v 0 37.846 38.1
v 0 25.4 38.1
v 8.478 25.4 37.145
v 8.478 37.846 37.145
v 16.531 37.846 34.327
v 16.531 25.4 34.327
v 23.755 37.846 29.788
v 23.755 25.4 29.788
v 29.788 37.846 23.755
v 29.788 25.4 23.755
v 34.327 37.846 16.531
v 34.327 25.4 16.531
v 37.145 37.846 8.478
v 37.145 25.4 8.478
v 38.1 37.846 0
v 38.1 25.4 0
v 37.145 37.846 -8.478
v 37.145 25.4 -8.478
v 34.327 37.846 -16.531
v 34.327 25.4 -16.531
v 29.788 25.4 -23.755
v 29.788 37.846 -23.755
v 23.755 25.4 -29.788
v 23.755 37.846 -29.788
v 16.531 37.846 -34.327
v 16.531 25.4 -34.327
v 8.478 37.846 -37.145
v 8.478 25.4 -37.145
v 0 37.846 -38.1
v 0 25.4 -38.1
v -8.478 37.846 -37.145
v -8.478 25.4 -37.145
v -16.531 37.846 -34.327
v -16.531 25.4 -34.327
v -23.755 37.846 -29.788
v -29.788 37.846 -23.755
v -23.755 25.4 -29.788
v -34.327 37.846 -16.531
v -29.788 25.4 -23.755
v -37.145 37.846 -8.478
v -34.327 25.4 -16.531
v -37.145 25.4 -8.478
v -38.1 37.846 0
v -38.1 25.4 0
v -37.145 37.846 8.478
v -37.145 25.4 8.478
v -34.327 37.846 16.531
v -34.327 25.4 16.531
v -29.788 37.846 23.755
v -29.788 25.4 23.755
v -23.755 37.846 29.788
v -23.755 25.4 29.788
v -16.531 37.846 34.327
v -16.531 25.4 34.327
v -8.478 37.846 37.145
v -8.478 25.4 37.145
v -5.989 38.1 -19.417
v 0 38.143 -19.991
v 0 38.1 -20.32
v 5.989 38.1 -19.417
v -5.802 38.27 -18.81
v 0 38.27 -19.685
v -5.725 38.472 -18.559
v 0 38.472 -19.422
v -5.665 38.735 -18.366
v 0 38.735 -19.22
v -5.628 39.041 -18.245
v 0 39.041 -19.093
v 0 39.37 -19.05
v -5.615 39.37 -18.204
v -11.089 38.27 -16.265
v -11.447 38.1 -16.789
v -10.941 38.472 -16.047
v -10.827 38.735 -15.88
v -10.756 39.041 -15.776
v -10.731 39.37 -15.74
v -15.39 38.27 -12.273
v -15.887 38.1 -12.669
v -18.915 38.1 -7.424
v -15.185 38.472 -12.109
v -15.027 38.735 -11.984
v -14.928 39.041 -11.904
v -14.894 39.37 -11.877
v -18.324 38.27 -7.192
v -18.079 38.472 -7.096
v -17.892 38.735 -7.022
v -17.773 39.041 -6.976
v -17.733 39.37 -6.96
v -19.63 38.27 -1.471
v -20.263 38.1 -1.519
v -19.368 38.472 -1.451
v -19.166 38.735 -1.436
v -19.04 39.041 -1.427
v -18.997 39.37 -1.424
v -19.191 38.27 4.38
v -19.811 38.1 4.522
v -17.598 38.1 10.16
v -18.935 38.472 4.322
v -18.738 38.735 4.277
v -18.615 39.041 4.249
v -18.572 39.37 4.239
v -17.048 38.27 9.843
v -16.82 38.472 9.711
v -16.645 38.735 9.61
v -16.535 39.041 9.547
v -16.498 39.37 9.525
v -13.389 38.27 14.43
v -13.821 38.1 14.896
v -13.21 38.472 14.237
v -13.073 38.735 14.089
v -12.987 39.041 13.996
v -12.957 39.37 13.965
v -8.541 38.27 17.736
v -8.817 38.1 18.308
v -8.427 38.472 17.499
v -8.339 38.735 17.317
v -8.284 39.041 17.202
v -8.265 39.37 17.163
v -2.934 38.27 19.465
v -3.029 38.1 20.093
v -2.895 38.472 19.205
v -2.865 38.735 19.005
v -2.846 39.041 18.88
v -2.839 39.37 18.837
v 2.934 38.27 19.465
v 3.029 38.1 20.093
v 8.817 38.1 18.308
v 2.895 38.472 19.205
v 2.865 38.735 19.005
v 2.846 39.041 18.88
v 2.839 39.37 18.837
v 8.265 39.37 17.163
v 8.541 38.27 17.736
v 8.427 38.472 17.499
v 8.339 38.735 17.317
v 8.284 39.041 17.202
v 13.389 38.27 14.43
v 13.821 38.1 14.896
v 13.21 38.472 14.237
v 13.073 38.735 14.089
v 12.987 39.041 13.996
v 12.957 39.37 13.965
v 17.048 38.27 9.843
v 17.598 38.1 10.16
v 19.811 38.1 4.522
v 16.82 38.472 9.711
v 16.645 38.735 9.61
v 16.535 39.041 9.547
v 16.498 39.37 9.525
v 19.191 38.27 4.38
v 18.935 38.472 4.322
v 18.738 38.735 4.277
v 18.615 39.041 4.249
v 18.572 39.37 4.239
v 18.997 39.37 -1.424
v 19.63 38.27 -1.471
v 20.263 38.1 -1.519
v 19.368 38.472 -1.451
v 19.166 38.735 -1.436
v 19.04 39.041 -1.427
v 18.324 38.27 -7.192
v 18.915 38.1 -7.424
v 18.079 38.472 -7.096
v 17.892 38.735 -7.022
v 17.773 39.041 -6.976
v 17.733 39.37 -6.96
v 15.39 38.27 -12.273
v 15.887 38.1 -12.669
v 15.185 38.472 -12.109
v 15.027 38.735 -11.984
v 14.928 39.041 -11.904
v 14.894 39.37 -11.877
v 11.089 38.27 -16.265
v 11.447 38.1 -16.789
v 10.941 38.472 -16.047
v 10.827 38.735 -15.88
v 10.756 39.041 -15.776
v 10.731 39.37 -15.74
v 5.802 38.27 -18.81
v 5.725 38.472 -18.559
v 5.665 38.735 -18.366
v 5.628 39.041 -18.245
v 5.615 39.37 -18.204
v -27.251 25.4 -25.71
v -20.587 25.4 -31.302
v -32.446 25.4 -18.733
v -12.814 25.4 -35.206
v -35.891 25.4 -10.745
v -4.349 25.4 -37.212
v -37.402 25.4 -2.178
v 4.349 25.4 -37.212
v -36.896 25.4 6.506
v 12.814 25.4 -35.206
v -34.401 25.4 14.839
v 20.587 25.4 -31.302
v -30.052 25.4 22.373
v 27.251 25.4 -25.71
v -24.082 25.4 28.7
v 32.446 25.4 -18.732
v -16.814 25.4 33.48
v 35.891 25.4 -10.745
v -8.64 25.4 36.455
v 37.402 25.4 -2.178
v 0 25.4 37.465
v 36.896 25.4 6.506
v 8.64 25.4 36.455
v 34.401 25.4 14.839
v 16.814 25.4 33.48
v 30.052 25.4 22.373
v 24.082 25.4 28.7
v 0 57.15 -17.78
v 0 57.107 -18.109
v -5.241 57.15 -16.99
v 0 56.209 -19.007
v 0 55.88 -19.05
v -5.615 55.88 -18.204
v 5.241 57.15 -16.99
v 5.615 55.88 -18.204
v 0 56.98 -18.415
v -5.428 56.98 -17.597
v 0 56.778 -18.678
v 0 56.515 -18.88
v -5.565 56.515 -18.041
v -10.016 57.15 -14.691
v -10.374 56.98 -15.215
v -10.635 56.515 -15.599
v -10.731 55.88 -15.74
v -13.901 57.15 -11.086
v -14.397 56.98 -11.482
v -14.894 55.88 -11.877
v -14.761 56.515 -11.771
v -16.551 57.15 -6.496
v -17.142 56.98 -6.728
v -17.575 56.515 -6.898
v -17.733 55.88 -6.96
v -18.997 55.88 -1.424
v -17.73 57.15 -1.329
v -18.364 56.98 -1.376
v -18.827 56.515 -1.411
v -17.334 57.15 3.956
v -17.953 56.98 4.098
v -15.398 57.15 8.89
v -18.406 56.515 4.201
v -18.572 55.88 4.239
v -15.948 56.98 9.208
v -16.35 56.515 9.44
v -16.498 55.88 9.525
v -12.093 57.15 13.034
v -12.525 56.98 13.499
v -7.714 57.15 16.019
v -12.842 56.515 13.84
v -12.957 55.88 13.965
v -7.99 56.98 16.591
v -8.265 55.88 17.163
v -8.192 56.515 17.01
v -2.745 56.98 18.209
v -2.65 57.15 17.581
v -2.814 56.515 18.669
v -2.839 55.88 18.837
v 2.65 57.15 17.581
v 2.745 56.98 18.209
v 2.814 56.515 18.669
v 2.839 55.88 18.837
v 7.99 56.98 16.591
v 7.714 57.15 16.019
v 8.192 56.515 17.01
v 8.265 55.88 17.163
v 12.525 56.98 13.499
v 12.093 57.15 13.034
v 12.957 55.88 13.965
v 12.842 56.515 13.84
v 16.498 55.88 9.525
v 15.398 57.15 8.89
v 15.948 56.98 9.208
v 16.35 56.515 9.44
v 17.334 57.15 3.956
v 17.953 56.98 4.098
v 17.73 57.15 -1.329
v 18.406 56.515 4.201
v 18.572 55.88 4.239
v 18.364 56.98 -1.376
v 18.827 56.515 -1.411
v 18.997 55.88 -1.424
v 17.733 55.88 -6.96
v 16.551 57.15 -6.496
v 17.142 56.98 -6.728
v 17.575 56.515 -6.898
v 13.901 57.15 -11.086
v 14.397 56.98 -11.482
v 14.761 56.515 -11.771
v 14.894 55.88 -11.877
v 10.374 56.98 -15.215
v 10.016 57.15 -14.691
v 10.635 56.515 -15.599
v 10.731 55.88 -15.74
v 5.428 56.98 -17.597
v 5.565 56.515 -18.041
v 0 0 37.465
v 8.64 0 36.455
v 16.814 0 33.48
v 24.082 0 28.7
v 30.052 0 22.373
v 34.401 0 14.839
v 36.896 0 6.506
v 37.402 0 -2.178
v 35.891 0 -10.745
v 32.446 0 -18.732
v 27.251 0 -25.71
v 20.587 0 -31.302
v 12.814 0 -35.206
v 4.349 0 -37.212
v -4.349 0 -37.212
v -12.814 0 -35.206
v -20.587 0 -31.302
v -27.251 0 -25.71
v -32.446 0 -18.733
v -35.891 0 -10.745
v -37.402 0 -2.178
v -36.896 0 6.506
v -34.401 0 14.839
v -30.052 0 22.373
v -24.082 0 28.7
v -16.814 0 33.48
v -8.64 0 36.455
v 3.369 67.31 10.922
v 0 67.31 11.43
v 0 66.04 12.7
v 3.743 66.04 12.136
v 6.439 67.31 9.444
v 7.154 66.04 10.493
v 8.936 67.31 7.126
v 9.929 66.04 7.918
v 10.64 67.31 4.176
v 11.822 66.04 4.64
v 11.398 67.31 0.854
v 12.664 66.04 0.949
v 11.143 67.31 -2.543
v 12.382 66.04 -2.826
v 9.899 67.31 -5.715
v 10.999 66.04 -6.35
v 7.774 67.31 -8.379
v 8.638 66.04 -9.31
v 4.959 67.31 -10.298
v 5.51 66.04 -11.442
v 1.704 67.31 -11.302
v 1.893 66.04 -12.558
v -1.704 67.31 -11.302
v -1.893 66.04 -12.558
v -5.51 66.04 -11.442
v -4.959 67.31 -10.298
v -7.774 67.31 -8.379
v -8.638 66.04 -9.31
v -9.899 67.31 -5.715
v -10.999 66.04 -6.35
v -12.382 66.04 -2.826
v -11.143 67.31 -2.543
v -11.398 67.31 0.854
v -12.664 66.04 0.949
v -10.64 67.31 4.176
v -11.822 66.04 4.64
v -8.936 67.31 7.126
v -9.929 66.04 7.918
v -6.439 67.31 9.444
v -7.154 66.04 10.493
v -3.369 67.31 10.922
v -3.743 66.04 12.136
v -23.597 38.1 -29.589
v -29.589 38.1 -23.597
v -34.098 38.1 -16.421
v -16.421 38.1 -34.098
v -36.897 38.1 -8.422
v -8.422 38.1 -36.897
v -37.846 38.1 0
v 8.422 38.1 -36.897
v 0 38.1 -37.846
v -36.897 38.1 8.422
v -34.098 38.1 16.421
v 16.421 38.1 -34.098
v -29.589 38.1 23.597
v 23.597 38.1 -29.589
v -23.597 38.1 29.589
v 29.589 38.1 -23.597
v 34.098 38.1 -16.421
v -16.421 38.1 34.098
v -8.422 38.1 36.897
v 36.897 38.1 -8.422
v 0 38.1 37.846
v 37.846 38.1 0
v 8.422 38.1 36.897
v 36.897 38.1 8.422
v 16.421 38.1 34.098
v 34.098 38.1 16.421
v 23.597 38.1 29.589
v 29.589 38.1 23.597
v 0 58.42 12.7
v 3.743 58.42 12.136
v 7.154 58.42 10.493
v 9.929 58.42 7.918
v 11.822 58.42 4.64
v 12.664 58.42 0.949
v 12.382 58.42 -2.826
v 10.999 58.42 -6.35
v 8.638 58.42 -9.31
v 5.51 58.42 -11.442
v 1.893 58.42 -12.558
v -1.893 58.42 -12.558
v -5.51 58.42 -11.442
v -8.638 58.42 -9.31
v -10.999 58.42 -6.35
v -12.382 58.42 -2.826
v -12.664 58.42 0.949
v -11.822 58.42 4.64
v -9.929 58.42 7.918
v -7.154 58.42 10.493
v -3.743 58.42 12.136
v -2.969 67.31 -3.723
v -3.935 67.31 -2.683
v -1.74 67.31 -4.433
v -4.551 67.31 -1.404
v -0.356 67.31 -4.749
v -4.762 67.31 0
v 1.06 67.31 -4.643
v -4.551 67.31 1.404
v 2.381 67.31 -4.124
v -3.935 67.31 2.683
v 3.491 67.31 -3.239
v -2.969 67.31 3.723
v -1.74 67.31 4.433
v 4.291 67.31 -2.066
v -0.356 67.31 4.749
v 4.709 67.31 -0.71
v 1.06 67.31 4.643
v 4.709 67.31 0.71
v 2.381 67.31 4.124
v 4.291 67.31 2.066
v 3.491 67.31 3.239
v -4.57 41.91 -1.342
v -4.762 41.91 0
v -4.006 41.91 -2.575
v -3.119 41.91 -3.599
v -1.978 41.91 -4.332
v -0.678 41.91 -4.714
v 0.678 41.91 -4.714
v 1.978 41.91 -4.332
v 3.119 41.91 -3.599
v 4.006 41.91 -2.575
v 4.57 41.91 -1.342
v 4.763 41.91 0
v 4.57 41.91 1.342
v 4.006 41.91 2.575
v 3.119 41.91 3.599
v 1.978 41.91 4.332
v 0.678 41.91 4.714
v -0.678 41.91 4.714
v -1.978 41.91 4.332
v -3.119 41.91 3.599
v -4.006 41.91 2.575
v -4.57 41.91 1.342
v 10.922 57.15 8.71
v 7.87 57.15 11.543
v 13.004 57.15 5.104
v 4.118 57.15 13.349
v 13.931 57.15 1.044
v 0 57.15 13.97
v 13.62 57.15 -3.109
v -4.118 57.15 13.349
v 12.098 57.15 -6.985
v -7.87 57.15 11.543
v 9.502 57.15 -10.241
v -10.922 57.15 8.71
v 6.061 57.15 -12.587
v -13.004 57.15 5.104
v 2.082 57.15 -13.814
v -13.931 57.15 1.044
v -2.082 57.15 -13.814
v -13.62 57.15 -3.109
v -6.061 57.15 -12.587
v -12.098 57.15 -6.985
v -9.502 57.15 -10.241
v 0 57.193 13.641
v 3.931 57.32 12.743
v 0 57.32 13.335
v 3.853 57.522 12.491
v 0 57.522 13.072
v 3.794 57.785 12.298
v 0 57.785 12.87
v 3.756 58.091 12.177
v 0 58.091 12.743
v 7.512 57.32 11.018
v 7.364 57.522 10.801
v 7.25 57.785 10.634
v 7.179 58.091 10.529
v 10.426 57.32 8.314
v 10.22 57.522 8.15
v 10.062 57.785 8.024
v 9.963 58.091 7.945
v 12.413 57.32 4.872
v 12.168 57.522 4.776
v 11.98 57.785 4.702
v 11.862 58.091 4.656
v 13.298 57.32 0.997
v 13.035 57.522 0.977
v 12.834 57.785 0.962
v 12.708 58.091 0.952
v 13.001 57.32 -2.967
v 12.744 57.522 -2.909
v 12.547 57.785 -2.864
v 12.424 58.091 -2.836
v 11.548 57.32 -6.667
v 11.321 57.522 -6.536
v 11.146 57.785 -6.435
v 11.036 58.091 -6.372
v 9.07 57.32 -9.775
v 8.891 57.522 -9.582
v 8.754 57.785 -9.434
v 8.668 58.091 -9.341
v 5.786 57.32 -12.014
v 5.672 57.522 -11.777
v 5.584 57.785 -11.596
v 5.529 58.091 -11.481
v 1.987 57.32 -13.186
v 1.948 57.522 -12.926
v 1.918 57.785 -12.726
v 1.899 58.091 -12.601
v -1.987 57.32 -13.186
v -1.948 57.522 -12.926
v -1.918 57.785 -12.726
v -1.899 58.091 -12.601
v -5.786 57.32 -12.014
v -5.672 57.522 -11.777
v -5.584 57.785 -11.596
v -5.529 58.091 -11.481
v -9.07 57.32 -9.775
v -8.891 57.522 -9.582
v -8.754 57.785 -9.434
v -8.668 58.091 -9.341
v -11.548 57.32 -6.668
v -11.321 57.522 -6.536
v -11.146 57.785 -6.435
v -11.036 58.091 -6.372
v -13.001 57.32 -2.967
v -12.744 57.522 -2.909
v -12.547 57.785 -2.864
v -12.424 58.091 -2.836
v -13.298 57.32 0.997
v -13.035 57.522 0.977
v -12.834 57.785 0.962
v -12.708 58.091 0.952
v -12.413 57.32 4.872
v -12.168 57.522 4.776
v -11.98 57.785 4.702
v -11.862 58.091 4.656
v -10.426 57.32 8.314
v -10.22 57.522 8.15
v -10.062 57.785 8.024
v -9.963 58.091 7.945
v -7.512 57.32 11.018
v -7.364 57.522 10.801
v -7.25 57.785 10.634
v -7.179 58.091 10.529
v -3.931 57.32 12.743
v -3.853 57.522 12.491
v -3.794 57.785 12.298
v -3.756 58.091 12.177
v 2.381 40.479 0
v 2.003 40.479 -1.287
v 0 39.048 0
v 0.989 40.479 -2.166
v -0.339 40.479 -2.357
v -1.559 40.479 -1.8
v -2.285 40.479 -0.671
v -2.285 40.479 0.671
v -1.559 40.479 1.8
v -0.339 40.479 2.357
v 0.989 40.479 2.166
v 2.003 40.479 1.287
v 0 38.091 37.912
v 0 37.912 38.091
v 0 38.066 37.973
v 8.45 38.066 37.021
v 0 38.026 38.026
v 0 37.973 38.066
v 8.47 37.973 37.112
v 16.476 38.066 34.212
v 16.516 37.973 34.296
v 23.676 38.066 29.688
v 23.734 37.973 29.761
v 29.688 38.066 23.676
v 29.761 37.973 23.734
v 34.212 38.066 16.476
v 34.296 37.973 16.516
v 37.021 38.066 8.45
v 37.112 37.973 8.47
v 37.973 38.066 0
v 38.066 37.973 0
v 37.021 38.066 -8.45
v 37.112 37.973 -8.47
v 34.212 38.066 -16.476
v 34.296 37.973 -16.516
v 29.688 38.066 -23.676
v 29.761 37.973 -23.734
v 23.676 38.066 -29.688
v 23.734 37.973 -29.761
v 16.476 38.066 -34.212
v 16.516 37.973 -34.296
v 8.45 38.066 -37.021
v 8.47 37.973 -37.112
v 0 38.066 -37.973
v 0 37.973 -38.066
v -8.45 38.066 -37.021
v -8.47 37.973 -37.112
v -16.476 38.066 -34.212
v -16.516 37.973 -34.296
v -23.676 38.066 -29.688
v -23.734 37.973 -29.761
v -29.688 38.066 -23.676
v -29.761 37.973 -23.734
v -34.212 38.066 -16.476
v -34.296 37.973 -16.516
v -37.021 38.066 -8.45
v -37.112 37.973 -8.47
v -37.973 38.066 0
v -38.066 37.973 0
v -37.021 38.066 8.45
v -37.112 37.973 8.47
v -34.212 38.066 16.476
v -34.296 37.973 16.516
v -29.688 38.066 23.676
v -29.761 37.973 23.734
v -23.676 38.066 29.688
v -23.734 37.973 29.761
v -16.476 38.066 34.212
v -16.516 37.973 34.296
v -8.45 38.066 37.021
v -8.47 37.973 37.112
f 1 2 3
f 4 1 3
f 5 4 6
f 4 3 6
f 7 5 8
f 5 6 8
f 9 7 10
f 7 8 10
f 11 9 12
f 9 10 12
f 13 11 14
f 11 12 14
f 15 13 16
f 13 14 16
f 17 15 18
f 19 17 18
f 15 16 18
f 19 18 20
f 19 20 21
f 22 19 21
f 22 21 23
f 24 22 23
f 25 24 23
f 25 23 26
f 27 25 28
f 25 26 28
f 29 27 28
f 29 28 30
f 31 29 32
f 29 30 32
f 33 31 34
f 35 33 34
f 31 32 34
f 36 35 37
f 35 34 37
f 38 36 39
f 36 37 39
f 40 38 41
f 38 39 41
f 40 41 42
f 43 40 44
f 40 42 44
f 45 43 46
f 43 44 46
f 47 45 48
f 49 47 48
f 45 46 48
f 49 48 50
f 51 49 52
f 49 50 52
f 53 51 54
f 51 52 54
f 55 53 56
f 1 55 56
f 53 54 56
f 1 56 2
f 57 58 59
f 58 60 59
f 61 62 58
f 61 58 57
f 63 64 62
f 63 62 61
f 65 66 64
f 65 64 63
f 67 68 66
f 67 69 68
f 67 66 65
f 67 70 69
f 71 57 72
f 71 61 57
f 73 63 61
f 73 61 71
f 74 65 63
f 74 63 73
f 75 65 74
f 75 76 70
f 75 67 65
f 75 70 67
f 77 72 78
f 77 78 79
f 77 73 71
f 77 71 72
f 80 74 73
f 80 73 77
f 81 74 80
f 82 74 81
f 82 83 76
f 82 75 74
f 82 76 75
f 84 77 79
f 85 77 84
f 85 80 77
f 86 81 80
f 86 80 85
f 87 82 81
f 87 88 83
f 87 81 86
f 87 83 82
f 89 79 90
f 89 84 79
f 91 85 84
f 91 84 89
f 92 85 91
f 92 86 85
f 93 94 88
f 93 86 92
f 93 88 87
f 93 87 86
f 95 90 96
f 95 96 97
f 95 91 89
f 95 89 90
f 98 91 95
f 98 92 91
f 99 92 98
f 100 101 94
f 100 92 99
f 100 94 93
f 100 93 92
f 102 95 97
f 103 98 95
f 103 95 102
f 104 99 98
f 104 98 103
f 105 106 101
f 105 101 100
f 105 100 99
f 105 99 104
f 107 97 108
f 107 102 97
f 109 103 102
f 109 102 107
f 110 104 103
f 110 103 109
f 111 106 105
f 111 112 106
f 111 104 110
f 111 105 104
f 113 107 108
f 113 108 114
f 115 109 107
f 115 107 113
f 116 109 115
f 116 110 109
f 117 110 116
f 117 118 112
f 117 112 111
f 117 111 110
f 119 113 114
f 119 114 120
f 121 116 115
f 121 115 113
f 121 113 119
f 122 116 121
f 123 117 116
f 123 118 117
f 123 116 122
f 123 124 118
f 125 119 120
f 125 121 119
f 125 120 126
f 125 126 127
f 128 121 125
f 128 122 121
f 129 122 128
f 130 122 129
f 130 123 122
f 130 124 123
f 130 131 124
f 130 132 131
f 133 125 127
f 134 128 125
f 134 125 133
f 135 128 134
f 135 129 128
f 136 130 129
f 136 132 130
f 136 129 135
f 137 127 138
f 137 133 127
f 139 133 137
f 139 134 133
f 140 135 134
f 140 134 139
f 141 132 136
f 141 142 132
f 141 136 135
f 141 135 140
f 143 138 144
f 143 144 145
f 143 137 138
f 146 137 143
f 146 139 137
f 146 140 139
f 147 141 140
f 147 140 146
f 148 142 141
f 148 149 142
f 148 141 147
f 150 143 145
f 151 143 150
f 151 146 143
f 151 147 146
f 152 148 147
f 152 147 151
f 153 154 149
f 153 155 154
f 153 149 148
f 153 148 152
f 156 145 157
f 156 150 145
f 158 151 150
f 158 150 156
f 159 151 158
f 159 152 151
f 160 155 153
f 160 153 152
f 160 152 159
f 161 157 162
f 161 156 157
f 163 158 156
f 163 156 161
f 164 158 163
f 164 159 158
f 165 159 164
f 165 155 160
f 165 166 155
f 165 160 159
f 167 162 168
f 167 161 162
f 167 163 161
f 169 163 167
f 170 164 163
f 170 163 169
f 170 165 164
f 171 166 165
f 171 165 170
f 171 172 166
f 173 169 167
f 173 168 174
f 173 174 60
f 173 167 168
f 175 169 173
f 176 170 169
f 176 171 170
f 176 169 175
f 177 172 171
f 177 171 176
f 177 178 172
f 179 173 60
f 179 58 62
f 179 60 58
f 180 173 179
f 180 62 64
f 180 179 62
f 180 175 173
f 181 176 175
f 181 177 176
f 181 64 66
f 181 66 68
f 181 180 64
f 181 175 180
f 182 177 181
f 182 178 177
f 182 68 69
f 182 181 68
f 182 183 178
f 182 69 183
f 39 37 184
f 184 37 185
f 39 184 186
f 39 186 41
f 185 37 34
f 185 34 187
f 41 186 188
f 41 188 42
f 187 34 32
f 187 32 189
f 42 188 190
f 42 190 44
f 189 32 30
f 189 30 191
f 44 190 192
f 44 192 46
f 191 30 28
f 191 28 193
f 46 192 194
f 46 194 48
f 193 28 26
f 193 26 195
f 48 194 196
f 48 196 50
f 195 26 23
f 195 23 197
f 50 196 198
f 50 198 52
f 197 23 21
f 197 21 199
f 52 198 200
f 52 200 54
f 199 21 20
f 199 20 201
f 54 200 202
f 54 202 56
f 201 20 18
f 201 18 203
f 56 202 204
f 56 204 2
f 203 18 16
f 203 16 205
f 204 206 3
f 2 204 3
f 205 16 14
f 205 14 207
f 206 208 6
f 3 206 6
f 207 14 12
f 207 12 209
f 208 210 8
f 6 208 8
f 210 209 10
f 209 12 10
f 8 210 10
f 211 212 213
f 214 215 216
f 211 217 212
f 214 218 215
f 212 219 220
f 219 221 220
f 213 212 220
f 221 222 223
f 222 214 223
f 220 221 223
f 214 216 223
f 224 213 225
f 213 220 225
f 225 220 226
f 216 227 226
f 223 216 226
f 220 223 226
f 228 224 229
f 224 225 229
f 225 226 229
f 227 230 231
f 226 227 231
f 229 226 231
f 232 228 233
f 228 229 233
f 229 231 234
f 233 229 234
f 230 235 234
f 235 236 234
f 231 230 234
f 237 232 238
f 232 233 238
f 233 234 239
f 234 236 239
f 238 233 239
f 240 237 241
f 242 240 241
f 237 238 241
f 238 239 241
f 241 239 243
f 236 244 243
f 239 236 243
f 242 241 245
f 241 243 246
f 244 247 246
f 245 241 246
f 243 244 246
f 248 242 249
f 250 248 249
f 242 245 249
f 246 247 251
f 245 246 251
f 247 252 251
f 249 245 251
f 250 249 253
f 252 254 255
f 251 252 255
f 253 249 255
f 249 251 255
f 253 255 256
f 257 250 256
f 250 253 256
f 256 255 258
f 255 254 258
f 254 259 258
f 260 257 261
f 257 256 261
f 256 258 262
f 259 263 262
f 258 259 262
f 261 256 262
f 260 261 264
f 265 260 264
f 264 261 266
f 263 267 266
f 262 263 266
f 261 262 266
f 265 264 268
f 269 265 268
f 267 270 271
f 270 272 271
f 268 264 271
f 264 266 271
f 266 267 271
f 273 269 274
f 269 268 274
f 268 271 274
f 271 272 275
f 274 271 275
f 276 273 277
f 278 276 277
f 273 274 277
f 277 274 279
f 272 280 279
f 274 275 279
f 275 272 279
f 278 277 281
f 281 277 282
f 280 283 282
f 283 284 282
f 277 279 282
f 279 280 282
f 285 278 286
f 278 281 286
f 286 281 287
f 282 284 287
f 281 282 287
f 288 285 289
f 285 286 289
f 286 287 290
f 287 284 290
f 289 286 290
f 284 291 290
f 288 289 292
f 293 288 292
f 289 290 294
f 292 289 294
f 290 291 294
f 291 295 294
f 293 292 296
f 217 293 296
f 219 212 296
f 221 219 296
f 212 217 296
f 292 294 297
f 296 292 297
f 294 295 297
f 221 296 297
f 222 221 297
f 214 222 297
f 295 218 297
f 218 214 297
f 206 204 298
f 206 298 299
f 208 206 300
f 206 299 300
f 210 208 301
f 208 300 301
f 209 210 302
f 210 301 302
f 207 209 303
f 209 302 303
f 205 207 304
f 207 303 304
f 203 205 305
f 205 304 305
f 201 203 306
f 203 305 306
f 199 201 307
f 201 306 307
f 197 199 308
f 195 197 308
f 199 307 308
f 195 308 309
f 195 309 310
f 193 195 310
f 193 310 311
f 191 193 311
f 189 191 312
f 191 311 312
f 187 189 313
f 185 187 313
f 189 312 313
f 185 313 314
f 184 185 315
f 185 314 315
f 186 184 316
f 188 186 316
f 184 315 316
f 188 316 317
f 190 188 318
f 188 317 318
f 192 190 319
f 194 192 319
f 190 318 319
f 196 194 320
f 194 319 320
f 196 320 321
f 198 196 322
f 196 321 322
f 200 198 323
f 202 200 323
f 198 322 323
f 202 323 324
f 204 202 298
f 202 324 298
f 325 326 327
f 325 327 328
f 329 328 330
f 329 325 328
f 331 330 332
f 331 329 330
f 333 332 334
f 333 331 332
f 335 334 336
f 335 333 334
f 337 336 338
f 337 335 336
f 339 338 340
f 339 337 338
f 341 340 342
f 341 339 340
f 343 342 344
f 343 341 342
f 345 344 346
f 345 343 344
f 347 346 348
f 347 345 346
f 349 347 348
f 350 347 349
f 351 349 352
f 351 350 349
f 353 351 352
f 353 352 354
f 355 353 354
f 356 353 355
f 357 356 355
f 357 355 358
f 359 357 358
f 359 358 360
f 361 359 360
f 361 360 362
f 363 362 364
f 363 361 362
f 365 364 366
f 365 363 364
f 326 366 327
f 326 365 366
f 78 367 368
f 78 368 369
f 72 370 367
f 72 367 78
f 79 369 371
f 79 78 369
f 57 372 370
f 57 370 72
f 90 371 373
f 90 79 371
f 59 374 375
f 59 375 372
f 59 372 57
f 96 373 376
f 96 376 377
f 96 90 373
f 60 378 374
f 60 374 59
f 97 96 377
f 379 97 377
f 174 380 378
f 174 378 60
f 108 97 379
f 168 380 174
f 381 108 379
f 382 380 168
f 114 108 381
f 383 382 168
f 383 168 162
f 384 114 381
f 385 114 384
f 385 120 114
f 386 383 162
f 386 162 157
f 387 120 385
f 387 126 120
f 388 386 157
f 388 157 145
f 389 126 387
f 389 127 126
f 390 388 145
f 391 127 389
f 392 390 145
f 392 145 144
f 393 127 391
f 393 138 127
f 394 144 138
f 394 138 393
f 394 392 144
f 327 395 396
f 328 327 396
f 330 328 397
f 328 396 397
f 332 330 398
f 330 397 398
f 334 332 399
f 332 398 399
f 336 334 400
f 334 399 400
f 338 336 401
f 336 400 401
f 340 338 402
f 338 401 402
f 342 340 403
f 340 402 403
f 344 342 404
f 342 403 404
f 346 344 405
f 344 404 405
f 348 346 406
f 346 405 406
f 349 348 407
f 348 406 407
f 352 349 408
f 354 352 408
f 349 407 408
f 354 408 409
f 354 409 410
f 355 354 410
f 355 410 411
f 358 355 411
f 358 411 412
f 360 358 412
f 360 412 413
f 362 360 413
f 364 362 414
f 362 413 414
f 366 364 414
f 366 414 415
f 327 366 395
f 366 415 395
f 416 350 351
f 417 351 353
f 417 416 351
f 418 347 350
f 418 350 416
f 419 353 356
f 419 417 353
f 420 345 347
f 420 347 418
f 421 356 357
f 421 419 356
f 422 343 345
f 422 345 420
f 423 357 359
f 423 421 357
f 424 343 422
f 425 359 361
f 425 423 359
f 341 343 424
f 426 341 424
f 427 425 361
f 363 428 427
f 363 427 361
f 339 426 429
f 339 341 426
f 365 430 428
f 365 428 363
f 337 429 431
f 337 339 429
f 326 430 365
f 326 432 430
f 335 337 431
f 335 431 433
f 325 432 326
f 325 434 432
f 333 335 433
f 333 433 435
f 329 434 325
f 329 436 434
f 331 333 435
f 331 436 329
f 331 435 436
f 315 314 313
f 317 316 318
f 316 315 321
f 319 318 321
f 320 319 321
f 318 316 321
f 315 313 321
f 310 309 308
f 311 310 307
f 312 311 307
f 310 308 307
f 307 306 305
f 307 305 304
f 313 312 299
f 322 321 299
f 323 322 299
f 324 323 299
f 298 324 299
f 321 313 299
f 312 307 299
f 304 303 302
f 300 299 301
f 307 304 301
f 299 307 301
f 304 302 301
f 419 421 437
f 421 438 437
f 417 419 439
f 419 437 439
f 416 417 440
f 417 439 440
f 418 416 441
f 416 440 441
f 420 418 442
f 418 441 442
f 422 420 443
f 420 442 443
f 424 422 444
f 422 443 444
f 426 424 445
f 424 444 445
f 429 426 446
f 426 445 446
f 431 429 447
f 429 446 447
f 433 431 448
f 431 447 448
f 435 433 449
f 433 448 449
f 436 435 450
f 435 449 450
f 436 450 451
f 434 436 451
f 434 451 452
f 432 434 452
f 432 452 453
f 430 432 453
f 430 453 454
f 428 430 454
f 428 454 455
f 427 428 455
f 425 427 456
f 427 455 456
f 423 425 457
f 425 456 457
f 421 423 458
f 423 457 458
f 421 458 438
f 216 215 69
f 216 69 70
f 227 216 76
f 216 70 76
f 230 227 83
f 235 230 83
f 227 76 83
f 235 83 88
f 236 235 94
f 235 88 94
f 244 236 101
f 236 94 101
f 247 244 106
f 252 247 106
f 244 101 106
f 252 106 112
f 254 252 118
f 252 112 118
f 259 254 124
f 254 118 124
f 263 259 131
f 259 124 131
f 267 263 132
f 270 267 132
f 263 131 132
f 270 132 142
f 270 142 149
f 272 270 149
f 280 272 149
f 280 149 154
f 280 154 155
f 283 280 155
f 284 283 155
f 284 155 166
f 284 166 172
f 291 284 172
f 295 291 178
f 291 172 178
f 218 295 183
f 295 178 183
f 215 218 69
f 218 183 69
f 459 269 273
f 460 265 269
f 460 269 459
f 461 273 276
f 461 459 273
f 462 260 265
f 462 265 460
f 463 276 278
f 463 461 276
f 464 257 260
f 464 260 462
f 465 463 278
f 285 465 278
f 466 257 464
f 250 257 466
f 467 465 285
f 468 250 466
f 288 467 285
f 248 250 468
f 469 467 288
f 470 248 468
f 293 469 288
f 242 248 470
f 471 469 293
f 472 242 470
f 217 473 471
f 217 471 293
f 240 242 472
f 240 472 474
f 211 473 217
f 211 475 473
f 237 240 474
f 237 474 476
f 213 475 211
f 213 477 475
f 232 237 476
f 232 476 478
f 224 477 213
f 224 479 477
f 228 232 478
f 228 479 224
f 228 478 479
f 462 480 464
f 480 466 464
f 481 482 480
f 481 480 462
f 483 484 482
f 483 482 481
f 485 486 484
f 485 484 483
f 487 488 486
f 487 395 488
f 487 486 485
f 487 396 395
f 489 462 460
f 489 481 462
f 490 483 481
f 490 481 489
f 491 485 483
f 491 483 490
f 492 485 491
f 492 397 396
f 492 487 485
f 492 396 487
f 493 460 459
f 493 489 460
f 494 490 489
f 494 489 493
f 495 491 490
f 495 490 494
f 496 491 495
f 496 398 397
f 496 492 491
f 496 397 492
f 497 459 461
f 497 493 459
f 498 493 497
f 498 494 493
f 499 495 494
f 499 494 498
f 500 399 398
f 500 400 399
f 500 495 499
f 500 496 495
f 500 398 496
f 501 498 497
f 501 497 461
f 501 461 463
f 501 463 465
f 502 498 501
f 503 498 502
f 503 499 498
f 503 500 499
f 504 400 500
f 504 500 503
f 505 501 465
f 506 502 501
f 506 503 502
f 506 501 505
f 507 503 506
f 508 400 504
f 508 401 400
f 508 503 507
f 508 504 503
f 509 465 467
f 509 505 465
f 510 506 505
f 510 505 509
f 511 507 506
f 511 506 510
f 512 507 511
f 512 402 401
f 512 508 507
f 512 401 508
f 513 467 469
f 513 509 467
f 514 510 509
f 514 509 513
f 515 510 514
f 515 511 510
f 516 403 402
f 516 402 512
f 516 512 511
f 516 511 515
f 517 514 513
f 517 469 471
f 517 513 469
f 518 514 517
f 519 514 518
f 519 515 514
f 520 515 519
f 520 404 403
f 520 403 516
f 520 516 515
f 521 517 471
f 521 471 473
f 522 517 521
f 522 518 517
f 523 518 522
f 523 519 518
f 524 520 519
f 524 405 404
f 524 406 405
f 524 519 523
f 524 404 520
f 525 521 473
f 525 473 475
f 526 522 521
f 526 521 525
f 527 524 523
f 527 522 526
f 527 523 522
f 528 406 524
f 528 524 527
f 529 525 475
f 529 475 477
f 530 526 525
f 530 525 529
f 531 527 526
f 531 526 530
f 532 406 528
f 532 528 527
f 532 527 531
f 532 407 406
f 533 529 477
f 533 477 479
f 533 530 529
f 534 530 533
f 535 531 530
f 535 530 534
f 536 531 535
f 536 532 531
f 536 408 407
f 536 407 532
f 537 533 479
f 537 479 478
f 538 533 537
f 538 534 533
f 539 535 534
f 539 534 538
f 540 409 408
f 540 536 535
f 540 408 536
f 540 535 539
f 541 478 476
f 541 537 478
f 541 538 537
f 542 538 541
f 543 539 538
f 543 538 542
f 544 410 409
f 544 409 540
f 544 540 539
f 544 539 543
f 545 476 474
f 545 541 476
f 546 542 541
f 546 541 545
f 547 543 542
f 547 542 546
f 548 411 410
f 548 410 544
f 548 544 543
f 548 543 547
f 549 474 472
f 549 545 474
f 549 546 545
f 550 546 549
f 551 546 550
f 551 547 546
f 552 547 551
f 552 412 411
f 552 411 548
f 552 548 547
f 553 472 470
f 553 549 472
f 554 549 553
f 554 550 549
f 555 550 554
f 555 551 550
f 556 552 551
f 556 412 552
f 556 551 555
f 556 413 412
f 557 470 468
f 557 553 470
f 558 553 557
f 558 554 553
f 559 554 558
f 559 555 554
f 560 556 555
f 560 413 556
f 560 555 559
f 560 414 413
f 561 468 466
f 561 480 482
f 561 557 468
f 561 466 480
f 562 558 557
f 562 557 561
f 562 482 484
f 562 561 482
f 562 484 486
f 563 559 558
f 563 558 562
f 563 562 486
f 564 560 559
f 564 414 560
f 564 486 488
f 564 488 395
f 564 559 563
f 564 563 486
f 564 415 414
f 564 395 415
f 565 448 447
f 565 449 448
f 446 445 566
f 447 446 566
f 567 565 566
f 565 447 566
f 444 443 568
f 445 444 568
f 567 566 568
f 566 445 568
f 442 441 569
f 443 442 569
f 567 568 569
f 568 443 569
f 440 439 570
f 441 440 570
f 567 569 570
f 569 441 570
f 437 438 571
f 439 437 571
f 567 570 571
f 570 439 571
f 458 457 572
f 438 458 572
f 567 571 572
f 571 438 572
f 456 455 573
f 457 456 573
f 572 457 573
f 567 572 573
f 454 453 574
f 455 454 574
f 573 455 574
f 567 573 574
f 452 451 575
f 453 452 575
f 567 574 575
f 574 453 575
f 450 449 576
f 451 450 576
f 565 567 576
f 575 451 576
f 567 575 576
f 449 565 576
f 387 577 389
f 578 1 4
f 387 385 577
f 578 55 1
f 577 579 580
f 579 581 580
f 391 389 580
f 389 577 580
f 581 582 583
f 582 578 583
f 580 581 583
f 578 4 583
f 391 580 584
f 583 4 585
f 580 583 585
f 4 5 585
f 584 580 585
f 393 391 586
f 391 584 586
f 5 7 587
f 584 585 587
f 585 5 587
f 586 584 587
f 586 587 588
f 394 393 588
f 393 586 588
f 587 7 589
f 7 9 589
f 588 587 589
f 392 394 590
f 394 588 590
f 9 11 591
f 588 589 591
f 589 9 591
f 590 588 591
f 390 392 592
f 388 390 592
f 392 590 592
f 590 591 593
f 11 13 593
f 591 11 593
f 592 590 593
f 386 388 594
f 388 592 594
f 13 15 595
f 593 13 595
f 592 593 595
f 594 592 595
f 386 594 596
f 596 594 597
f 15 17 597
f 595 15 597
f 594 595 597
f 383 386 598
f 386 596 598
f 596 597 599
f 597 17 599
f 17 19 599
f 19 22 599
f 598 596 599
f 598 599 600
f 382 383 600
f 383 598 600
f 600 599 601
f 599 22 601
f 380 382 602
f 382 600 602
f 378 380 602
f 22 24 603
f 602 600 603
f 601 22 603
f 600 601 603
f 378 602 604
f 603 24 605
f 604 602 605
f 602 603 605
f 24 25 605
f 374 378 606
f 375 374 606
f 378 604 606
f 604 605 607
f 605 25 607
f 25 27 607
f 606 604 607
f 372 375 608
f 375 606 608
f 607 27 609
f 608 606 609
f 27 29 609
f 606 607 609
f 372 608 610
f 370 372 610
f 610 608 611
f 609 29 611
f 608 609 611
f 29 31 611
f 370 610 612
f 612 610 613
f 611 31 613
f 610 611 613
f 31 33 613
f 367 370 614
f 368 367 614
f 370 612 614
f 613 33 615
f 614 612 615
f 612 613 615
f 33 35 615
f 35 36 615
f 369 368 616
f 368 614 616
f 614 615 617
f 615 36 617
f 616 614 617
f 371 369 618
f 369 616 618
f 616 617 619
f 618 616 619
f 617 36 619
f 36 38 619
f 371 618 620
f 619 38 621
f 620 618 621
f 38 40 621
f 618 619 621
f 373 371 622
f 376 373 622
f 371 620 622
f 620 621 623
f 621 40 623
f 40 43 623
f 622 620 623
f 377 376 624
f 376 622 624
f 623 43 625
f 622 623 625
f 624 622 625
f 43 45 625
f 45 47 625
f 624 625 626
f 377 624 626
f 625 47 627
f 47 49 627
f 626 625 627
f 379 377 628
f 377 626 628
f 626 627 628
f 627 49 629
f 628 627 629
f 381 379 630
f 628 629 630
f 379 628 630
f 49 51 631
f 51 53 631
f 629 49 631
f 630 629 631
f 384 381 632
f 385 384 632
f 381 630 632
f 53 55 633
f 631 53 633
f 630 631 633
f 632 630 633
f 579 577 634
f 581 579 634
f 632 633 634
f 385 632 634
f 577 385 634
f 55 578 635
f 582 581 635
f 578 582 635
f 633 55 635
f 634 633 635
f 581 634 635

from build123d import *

# Parameters (mm, degrees)
SKETCH1_R                        = 37.465
BOSS_EXTRUDE1_DEPTH              = 25.4
SKETCH2_R                        = 38.1
BOSS_EXTRUDE2_DEPTH              = 12.7
SKETCH3_R                        = 19.05
BOSS_EXTRUDE3_DEPTH              = 19.05
SKETCH4_R                        = 12.7
BOSS_EXTRUDE4_DEPTH              = 10.16
FILLET1_SIZE                     = 1.27
FILLET2_R                        = 1.27
FILLET3_R                        = 0.254
FILLET4_R                        = 1.27
FILLET5_R                        = 1.27
F_3_8_0_375_DIAMETER_HOLE1_D     = 9.525
F_3_8_0_375_DIAMETER_HOLE1_DEPTH = 25.4
F_3_8_0_375_DIAMETER_HOLE1_TIP   = 2.861598698


with BuildPart() as part:
    # Sketch1 → Boss-Extrude1 (new body)
    with BuildSketch(Plane(origin=(0, 0, 0), x_dir=(1, 0, 0), z_dir=(0, 1, 0))):
        Circle(SKETCH1_R)
    extrude(amount=BOSS_EXTRUDE1_DEPTH)

    # Sketch2 → Boss-Extrude2 (add)
    with BuildSketch(Plane(origin=(0, 25.4, 0), x_dir=(1, 0, 0), z_dir=(0, 1, 0))):
        Circle(SKETCH2_R)
    extrude(amount=BOSS_EXTRUDE2_DEPTH)

    # Sketch3 → Boss-Extrude3 (add)
    with BuildSketch(Plane(origin=(0, 38.1, 0), x_dir=(1, 0, 0), z_dir=(0, 1, 0))):
        Circle(SKETCH3_R)
    extrude(amount=BOSS_EXTRUDE3_DEPTH)

    # Sketch4 → Boss-Extrude4 (add)
    with BuildSketch(Plane(origin=(0, 57.15, 0), x_dir=(1, 0, 0), z_dir=(0, 1, 0))):
        Circle(SKETCH4_R)
    extrude(amount=BOSS_EXTRUDE4_DEPTH)

    # Fillet1
    fillet1_edges = [part.edges().sort_by_distance(p)[0] for p in [
        (-12.7, 67.31, 0),
    ]]
    chamfer(fillet1_edges, length=FILLET1_SIZE)

    # Fillet2
    fillet2_edges = [part.edges().sort_by_distance(p)[0] for p in [
        (-19.05, 57.15, 0),
    ]]
    fillet(fillet2_edges, radius=FILLET2_R)

    # Fillet3
    fillet3_edges = [part.edges().sort_by_distance(p)[0] for p in [
        (-38.1, 38.1, 0),
    ]]
    fillet(fillet3_edges, radius=FILLET3_R)

    # Fillet4
    fillet4_edges = [part.edges().sort_by_distance(p)[0] for p in [
        (-19.05, 38.1, 0),
    ]]
    fillet(fillet4_edges, radius=FILLET4_R)

    # Fillet5
    fillet5_edges = [part.edges().sort_by_distance(p)[0] for p in [
        (-12.7, 57.15, 0),
    ]]
    fillet(fillet5_edges, radius=FILLET5_R)

    # 3/8 (0.375) Diameter Hole1
    with Locations(Plane(origin=(0, 67.31, 0), x_dir=(1, 0, 0), z_dir=(0, 1, 0))):
        with Locations((0, 0)):
            Hole(F_3_8_0_375_DIAMETER_HOLE1_D / 2, depth=F_3_8_0_375_DIAMETER_HOLE1_DEPTH)
            with Locations((0, 0, -(F_3_8_0_375_DIAMETER_HOLE1_DEPTH + F_3_8_0_375_DIAMETER_HOLE1_TIP / 2))):  # 118° drill point
                Cone(0, F_3_8_0_375_DIAMETER_HOLE1_D / 2, F_3_8_0_375_DIAMETER_HOLE1_TIP, mode=Mode.SUBTRACT)


solid = part.part
